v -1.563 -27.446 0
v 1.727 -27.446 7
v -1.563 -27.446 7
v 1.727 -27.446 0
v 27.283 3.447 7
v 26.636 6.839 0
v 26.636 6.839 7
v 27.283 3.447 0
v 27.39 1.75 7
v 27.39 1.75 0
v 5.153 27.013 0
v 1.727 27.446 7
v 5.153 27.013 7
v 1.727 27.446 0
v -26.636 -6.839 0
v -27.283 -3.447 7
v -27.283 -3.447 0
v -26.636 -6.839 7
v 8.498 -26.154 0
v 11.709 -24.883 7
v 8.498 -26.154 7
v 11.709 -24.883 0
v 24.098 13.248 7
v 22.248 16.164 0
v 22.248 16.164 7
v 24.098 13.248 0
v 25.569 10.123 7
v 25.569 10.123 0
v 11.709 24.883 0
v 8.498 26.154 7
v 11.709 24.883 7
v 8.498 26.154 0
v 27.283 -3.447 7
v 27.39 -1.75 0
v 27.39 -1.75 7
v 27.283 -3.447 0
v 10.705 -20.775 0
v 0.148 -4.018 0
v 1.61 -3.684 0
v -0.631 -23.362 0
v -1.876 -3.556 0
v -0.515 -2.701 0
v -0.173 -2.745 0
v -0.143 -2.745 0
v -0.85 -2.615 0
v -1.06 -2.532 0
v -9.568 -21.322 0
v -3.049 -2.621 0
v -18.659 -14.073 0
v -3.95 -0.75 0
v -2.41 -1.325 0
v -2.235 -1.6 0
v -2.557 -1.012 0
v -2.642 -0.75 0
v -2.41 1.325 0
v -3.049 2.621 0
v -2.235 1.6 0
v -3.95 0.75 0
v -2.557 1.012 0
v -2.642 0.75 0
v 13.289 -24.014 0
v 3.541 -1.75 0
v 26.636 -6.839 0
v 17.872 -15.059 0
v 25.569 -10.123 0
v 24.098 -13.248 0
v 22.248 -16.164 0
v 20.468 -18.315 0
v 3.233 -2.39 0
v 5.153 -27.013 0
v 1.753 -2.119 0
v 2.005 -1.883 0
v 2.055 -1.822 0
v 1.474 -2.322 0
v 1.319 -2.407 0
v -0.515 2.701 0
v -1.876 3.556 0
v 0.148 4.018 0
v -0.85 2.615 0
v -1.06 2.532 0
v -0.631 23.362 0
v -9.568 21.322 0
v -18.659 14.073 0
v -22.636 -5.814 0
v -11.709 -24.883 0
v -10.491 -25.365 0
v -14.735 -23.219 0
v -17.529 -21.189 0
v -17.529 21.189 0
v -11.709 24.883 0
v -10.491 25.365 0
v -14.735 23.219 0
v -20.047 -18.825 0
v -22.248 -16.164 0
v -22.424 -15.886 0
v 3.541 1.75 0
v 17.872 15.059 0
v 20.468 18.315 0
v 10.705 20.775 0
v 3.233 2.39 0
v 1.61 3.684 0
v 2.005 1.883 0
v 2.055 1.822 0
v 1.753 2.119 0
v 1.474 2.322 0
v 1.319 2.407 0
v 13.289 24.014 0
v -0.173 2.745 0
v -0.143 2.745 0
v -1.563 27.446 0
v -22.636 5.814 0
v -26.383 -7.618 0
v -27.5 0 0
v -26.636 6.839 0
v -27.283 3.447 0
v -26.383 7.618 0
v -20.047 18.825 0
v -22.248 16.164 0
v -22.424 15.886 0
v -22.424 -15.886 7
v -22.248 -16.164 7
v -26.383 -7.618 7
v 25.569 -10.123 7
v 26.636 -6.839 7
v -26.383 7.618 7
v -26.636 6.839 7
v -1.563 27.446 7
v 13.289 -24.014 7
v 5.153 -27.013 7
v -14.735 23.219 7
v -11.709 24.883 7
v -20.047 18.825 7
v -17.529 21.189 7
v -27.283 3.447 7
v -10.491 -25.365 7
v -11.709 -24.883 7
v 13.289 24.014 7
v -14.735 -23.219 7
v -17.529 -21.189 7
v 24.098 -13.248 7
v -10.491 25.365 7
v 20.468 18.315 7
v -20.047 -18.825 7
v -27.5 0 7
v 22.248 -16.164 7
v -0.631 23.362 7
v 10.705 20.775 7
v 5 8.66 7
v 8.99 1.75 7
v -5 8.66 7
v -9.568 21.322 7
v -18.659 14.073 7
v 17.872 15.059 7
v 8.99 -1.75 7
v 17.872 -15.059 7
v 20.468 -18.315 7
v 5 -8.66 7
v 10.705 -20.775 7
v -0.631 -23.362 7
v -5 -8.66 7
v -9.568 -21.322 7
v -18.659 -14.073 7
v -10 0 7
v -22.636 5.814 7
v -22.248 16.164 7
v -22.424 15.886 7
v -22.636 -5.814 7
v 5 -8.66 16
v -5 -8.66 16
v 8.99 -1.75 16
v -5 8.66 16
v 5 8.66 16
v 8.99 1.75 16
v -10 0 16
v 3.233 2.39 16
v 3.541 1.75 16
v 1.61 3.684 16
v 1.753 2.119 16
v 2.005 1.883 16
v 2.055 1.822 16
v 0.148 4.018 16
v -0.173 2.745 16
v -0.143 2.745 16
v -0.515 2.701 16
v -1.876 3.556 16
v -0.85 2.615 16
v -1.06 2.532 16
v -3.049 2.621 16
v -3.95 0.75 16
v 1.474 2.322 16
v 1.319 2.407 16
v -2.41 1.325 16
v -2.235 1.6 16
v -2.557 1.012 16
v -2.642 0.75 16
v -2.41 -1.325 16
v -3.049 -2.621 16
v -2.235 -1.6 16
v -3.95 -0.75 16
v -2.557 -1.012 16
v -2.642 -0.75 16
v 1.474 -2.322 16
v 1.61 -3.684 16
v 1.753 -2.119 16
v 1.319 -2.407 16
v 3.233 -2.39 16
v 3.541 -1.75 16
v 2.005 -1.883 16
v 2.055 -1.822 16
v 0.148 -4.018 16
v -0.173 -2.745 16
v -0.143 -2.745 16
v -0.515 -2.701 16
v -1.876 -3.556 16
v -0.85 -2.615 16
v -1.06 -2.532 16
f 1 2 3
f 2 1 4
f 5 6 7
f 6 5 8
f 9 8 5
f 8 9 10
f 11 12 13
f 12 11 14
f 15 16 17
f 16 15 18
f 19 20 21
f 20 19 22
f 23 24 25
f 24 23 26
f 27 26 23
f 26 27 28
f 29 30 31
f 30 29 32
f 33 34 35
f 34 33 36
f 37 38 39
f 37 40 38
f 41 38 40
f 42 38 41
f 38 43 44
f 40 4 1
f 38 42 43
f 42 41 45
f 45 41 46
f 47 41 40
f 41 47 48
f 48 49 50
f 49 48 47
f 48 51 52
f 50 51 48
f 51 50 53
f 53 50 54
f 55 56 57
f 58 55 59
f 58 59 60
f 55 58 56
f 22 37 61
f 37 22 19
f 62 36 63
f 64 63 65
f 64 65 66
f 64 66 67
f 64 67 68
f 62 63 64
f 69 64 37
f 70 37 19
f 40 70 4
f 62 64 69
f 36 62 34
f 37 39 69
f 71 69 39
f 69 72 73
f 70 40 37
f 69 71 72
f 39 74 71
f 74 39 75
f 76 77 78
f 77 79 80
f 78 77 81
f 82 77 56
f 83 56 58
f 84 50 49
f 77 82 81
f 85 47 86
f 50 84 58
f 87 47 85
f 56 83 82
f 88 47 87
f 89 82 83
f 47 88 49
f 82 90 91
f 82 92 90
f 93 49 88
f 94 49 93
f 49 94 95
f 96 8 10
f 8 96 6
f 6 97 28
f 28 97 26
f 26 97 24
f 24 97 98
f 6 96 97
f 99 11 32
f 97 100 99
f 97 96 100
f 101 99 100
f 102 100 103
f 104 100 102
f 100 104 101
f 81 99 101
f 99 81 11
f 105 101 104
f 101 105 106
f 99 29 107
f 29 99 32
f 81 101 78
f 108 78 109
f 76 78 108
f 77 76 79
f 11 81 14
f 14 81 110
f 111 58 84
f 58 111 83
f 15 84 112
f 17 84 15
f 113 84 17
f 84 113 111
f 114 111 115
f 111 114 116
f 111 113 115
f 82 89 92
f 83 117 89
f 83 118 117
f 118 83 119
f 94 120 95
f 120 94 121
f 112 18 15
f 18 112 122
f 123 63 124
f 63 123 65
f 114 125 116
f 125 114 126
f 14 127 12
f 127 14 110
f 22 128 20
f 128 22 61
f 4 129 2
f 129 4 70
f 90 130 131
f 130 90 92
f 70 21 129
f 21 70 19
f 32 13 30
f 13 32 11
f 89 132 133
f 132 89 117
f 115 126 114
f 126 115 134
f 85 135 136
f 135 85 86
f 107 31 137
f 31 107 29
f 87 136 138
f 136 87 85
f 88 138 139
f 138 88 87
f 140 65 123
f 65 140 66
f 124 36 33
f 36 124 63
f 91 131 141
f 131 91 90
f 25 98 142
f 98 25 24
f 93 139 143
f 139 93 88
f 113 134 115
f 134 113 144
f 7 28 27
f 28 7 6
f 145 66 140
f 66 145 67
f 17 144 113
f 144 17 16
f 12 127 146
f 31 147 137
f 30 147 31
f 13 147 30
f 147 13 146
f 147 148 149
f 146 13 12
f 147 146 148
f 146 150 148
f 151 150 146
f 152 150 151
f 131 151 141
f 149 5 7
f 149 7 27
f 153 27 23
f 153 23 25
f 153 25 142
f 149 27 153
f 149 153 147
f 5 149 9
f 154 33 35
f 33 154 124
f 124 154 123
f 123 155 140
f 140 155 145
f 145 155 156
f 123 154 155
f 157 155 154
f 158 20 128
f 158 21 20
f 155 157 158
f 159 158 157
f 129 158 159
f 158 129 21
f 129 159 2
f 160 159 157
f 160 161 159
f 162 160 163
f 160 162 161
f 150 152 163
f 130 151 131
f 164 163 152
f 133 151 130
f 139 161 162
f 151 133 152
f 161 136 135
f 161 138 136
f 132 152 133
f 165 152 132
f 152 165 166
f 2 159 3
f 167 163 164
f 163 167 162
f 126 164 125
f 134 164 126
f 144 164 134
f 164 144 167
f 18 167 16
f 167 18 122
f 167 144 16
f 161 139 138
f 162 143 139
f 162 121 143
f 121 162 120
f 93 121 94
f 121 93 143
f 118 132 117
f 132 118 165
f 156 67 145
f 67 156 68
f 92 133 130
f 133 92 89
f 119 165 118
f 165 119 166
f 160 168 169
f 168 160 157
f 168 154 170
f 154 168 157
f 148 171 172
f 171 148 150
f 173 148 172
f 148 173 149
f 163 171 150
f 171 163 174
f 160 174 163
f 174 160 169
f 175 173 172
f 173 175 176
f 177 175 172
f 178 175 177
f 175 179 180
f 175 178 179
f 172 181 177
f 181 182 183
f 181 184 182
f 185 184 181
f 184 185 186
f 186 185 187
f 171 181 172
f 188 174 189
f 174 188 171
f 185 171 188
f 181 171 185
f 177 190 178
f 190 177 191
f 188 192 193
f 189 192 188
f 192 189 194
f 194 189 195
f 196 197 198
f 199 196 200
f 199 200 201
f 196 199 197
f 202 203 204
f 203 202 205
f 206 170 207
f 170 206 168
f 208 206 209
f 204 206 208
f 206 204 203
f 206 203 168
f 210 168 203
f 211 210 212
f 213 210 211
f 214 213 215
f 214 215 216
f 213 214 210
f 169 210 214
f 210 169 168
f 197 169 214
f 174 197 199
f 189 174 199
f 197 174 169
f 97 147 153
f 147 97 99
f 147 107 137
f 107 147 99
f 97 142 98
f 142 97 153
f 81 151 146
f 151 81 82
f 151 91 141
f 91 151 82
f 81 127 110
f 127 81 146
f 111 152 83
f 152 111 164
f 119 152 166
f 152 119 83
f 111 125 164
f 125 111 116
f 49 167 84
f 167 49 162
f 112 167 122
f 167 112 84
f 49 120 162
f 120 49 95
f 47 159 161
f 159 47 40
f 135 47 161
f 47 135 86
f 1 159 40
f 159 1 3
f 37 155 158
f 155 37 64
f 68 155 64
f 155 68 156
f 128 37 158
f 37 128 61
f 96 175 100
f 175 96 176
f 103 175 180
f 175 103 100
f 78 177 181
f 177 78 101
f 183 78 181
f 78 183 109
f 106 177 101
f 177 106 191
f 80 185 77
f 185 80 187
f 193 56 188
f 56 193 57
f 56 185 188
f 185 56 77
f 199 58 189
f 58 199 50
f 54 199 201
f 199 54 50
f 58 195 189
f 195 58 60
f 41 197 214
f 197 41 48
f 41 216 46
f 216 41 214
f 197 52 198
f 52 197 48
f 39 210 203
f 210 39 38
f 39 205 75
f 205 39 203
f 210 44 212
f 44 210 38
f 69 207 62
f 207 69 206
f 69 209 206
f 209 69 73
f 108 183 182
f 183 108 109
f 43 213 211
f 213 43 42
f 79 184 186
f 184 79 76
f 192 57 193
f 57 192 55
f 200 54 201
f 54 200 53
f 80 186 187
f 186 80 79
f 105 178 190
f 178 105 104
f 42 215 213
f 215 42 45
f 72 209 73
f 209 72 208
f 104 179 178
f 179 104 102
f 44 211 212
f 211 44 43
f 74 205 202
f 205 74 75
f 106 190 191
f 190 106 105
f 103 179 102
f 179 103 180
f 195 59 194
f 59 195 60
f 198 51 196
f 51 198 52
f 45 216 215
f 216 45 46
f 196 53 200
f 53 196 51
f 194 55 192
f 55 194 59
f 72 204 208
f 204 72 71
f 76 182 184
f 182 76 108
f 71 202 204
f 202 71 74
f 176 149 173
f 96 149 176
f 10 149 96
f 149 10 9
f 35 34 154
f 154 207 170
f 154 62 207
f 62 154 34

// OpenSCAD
knobThickness=7;
spokeNippleSplineCoreDia=5.2;
spokeNippleSplineOuterDia=6.4;  // from Park tool SW-12 specs
spokeNippleSplineToothWidth=1.2;
spokeNippleSplineTolerance=0.15;
spokeDia=3.3; // actual spoke diameter, measured
spokeSlotClearance=0.1; // space to allow on either side for spoke to go through the slot
splineCount=7;

knobCoreOuterDia=20; // adjust to allow snug fit for hex flat - box end wrench
knobCoreThickness=9;

spokeNippleSplineToothHeight=spokeNippleSplineOuterDia-spokeNippleSplineCoreDia;
knobDia=55;

toothSlotAlignmentAdjust=360/(splineCount*2);  // degrees


overlap=0.01;
$fn=50;

difference() {
    union() {
        cylinder(d=knobDia, h=knobThickness);
        cylinder(d=knobCoreOuterDia, h=knobThickness+knobCoreThickness, $fn=6);
    }
    for (i=[1:splineCount-1]) {
        rotate([0,0,360/splineCount*i])
            translate([knobDia/2,0,-overlap])
                //cylinder(d=knobDia/3, h=knobThickness+overlap*2);
                translate([-knobDia/12,-knobDia/12,0])
                cube([knobDia/3,knobDia/6,knobThickness+overlap*2]);
    }
    translate([0,0,-overlap])
        spokeNippleSplineShape();
    // Spoke insertion slot
    translate([0,-(spokeDia+spokeSlotClearance*2)/2,-overlap])
        cube([knobDia/2+overlap,(spokeDia+spokeSlotClearance*2),
            knobThickness+knobCoreThickness+overlap*2]);

}

module spokeNippleSplineShape() {
    union() {
        cylinder(d=spokeNippleSplineCoreDia+spokeNippleSplineTolerance*2, 
                h=knobThickness+knobCoreThickness+overlap*2);
        for (i=[0:splineCount-1]) {
            rotate([0,0,toothSlotAlignmentAdjust+(360/splineCount*i)])
                translate([0,-spokeNippleSplineToothWidth/2-spokeNippleSplineTolerance,0])
                    cube([spokeNippleSplineCoreDia/2+spokeNippleSplineToothHeight+spokeNippleSplineTolerance, 
                        spokeNippleSplineToothWidth+spokeNippleSplineTolerance*2,
                        knobThickness+knobCoreThickness+overlap*2]);
        }
    }
}
